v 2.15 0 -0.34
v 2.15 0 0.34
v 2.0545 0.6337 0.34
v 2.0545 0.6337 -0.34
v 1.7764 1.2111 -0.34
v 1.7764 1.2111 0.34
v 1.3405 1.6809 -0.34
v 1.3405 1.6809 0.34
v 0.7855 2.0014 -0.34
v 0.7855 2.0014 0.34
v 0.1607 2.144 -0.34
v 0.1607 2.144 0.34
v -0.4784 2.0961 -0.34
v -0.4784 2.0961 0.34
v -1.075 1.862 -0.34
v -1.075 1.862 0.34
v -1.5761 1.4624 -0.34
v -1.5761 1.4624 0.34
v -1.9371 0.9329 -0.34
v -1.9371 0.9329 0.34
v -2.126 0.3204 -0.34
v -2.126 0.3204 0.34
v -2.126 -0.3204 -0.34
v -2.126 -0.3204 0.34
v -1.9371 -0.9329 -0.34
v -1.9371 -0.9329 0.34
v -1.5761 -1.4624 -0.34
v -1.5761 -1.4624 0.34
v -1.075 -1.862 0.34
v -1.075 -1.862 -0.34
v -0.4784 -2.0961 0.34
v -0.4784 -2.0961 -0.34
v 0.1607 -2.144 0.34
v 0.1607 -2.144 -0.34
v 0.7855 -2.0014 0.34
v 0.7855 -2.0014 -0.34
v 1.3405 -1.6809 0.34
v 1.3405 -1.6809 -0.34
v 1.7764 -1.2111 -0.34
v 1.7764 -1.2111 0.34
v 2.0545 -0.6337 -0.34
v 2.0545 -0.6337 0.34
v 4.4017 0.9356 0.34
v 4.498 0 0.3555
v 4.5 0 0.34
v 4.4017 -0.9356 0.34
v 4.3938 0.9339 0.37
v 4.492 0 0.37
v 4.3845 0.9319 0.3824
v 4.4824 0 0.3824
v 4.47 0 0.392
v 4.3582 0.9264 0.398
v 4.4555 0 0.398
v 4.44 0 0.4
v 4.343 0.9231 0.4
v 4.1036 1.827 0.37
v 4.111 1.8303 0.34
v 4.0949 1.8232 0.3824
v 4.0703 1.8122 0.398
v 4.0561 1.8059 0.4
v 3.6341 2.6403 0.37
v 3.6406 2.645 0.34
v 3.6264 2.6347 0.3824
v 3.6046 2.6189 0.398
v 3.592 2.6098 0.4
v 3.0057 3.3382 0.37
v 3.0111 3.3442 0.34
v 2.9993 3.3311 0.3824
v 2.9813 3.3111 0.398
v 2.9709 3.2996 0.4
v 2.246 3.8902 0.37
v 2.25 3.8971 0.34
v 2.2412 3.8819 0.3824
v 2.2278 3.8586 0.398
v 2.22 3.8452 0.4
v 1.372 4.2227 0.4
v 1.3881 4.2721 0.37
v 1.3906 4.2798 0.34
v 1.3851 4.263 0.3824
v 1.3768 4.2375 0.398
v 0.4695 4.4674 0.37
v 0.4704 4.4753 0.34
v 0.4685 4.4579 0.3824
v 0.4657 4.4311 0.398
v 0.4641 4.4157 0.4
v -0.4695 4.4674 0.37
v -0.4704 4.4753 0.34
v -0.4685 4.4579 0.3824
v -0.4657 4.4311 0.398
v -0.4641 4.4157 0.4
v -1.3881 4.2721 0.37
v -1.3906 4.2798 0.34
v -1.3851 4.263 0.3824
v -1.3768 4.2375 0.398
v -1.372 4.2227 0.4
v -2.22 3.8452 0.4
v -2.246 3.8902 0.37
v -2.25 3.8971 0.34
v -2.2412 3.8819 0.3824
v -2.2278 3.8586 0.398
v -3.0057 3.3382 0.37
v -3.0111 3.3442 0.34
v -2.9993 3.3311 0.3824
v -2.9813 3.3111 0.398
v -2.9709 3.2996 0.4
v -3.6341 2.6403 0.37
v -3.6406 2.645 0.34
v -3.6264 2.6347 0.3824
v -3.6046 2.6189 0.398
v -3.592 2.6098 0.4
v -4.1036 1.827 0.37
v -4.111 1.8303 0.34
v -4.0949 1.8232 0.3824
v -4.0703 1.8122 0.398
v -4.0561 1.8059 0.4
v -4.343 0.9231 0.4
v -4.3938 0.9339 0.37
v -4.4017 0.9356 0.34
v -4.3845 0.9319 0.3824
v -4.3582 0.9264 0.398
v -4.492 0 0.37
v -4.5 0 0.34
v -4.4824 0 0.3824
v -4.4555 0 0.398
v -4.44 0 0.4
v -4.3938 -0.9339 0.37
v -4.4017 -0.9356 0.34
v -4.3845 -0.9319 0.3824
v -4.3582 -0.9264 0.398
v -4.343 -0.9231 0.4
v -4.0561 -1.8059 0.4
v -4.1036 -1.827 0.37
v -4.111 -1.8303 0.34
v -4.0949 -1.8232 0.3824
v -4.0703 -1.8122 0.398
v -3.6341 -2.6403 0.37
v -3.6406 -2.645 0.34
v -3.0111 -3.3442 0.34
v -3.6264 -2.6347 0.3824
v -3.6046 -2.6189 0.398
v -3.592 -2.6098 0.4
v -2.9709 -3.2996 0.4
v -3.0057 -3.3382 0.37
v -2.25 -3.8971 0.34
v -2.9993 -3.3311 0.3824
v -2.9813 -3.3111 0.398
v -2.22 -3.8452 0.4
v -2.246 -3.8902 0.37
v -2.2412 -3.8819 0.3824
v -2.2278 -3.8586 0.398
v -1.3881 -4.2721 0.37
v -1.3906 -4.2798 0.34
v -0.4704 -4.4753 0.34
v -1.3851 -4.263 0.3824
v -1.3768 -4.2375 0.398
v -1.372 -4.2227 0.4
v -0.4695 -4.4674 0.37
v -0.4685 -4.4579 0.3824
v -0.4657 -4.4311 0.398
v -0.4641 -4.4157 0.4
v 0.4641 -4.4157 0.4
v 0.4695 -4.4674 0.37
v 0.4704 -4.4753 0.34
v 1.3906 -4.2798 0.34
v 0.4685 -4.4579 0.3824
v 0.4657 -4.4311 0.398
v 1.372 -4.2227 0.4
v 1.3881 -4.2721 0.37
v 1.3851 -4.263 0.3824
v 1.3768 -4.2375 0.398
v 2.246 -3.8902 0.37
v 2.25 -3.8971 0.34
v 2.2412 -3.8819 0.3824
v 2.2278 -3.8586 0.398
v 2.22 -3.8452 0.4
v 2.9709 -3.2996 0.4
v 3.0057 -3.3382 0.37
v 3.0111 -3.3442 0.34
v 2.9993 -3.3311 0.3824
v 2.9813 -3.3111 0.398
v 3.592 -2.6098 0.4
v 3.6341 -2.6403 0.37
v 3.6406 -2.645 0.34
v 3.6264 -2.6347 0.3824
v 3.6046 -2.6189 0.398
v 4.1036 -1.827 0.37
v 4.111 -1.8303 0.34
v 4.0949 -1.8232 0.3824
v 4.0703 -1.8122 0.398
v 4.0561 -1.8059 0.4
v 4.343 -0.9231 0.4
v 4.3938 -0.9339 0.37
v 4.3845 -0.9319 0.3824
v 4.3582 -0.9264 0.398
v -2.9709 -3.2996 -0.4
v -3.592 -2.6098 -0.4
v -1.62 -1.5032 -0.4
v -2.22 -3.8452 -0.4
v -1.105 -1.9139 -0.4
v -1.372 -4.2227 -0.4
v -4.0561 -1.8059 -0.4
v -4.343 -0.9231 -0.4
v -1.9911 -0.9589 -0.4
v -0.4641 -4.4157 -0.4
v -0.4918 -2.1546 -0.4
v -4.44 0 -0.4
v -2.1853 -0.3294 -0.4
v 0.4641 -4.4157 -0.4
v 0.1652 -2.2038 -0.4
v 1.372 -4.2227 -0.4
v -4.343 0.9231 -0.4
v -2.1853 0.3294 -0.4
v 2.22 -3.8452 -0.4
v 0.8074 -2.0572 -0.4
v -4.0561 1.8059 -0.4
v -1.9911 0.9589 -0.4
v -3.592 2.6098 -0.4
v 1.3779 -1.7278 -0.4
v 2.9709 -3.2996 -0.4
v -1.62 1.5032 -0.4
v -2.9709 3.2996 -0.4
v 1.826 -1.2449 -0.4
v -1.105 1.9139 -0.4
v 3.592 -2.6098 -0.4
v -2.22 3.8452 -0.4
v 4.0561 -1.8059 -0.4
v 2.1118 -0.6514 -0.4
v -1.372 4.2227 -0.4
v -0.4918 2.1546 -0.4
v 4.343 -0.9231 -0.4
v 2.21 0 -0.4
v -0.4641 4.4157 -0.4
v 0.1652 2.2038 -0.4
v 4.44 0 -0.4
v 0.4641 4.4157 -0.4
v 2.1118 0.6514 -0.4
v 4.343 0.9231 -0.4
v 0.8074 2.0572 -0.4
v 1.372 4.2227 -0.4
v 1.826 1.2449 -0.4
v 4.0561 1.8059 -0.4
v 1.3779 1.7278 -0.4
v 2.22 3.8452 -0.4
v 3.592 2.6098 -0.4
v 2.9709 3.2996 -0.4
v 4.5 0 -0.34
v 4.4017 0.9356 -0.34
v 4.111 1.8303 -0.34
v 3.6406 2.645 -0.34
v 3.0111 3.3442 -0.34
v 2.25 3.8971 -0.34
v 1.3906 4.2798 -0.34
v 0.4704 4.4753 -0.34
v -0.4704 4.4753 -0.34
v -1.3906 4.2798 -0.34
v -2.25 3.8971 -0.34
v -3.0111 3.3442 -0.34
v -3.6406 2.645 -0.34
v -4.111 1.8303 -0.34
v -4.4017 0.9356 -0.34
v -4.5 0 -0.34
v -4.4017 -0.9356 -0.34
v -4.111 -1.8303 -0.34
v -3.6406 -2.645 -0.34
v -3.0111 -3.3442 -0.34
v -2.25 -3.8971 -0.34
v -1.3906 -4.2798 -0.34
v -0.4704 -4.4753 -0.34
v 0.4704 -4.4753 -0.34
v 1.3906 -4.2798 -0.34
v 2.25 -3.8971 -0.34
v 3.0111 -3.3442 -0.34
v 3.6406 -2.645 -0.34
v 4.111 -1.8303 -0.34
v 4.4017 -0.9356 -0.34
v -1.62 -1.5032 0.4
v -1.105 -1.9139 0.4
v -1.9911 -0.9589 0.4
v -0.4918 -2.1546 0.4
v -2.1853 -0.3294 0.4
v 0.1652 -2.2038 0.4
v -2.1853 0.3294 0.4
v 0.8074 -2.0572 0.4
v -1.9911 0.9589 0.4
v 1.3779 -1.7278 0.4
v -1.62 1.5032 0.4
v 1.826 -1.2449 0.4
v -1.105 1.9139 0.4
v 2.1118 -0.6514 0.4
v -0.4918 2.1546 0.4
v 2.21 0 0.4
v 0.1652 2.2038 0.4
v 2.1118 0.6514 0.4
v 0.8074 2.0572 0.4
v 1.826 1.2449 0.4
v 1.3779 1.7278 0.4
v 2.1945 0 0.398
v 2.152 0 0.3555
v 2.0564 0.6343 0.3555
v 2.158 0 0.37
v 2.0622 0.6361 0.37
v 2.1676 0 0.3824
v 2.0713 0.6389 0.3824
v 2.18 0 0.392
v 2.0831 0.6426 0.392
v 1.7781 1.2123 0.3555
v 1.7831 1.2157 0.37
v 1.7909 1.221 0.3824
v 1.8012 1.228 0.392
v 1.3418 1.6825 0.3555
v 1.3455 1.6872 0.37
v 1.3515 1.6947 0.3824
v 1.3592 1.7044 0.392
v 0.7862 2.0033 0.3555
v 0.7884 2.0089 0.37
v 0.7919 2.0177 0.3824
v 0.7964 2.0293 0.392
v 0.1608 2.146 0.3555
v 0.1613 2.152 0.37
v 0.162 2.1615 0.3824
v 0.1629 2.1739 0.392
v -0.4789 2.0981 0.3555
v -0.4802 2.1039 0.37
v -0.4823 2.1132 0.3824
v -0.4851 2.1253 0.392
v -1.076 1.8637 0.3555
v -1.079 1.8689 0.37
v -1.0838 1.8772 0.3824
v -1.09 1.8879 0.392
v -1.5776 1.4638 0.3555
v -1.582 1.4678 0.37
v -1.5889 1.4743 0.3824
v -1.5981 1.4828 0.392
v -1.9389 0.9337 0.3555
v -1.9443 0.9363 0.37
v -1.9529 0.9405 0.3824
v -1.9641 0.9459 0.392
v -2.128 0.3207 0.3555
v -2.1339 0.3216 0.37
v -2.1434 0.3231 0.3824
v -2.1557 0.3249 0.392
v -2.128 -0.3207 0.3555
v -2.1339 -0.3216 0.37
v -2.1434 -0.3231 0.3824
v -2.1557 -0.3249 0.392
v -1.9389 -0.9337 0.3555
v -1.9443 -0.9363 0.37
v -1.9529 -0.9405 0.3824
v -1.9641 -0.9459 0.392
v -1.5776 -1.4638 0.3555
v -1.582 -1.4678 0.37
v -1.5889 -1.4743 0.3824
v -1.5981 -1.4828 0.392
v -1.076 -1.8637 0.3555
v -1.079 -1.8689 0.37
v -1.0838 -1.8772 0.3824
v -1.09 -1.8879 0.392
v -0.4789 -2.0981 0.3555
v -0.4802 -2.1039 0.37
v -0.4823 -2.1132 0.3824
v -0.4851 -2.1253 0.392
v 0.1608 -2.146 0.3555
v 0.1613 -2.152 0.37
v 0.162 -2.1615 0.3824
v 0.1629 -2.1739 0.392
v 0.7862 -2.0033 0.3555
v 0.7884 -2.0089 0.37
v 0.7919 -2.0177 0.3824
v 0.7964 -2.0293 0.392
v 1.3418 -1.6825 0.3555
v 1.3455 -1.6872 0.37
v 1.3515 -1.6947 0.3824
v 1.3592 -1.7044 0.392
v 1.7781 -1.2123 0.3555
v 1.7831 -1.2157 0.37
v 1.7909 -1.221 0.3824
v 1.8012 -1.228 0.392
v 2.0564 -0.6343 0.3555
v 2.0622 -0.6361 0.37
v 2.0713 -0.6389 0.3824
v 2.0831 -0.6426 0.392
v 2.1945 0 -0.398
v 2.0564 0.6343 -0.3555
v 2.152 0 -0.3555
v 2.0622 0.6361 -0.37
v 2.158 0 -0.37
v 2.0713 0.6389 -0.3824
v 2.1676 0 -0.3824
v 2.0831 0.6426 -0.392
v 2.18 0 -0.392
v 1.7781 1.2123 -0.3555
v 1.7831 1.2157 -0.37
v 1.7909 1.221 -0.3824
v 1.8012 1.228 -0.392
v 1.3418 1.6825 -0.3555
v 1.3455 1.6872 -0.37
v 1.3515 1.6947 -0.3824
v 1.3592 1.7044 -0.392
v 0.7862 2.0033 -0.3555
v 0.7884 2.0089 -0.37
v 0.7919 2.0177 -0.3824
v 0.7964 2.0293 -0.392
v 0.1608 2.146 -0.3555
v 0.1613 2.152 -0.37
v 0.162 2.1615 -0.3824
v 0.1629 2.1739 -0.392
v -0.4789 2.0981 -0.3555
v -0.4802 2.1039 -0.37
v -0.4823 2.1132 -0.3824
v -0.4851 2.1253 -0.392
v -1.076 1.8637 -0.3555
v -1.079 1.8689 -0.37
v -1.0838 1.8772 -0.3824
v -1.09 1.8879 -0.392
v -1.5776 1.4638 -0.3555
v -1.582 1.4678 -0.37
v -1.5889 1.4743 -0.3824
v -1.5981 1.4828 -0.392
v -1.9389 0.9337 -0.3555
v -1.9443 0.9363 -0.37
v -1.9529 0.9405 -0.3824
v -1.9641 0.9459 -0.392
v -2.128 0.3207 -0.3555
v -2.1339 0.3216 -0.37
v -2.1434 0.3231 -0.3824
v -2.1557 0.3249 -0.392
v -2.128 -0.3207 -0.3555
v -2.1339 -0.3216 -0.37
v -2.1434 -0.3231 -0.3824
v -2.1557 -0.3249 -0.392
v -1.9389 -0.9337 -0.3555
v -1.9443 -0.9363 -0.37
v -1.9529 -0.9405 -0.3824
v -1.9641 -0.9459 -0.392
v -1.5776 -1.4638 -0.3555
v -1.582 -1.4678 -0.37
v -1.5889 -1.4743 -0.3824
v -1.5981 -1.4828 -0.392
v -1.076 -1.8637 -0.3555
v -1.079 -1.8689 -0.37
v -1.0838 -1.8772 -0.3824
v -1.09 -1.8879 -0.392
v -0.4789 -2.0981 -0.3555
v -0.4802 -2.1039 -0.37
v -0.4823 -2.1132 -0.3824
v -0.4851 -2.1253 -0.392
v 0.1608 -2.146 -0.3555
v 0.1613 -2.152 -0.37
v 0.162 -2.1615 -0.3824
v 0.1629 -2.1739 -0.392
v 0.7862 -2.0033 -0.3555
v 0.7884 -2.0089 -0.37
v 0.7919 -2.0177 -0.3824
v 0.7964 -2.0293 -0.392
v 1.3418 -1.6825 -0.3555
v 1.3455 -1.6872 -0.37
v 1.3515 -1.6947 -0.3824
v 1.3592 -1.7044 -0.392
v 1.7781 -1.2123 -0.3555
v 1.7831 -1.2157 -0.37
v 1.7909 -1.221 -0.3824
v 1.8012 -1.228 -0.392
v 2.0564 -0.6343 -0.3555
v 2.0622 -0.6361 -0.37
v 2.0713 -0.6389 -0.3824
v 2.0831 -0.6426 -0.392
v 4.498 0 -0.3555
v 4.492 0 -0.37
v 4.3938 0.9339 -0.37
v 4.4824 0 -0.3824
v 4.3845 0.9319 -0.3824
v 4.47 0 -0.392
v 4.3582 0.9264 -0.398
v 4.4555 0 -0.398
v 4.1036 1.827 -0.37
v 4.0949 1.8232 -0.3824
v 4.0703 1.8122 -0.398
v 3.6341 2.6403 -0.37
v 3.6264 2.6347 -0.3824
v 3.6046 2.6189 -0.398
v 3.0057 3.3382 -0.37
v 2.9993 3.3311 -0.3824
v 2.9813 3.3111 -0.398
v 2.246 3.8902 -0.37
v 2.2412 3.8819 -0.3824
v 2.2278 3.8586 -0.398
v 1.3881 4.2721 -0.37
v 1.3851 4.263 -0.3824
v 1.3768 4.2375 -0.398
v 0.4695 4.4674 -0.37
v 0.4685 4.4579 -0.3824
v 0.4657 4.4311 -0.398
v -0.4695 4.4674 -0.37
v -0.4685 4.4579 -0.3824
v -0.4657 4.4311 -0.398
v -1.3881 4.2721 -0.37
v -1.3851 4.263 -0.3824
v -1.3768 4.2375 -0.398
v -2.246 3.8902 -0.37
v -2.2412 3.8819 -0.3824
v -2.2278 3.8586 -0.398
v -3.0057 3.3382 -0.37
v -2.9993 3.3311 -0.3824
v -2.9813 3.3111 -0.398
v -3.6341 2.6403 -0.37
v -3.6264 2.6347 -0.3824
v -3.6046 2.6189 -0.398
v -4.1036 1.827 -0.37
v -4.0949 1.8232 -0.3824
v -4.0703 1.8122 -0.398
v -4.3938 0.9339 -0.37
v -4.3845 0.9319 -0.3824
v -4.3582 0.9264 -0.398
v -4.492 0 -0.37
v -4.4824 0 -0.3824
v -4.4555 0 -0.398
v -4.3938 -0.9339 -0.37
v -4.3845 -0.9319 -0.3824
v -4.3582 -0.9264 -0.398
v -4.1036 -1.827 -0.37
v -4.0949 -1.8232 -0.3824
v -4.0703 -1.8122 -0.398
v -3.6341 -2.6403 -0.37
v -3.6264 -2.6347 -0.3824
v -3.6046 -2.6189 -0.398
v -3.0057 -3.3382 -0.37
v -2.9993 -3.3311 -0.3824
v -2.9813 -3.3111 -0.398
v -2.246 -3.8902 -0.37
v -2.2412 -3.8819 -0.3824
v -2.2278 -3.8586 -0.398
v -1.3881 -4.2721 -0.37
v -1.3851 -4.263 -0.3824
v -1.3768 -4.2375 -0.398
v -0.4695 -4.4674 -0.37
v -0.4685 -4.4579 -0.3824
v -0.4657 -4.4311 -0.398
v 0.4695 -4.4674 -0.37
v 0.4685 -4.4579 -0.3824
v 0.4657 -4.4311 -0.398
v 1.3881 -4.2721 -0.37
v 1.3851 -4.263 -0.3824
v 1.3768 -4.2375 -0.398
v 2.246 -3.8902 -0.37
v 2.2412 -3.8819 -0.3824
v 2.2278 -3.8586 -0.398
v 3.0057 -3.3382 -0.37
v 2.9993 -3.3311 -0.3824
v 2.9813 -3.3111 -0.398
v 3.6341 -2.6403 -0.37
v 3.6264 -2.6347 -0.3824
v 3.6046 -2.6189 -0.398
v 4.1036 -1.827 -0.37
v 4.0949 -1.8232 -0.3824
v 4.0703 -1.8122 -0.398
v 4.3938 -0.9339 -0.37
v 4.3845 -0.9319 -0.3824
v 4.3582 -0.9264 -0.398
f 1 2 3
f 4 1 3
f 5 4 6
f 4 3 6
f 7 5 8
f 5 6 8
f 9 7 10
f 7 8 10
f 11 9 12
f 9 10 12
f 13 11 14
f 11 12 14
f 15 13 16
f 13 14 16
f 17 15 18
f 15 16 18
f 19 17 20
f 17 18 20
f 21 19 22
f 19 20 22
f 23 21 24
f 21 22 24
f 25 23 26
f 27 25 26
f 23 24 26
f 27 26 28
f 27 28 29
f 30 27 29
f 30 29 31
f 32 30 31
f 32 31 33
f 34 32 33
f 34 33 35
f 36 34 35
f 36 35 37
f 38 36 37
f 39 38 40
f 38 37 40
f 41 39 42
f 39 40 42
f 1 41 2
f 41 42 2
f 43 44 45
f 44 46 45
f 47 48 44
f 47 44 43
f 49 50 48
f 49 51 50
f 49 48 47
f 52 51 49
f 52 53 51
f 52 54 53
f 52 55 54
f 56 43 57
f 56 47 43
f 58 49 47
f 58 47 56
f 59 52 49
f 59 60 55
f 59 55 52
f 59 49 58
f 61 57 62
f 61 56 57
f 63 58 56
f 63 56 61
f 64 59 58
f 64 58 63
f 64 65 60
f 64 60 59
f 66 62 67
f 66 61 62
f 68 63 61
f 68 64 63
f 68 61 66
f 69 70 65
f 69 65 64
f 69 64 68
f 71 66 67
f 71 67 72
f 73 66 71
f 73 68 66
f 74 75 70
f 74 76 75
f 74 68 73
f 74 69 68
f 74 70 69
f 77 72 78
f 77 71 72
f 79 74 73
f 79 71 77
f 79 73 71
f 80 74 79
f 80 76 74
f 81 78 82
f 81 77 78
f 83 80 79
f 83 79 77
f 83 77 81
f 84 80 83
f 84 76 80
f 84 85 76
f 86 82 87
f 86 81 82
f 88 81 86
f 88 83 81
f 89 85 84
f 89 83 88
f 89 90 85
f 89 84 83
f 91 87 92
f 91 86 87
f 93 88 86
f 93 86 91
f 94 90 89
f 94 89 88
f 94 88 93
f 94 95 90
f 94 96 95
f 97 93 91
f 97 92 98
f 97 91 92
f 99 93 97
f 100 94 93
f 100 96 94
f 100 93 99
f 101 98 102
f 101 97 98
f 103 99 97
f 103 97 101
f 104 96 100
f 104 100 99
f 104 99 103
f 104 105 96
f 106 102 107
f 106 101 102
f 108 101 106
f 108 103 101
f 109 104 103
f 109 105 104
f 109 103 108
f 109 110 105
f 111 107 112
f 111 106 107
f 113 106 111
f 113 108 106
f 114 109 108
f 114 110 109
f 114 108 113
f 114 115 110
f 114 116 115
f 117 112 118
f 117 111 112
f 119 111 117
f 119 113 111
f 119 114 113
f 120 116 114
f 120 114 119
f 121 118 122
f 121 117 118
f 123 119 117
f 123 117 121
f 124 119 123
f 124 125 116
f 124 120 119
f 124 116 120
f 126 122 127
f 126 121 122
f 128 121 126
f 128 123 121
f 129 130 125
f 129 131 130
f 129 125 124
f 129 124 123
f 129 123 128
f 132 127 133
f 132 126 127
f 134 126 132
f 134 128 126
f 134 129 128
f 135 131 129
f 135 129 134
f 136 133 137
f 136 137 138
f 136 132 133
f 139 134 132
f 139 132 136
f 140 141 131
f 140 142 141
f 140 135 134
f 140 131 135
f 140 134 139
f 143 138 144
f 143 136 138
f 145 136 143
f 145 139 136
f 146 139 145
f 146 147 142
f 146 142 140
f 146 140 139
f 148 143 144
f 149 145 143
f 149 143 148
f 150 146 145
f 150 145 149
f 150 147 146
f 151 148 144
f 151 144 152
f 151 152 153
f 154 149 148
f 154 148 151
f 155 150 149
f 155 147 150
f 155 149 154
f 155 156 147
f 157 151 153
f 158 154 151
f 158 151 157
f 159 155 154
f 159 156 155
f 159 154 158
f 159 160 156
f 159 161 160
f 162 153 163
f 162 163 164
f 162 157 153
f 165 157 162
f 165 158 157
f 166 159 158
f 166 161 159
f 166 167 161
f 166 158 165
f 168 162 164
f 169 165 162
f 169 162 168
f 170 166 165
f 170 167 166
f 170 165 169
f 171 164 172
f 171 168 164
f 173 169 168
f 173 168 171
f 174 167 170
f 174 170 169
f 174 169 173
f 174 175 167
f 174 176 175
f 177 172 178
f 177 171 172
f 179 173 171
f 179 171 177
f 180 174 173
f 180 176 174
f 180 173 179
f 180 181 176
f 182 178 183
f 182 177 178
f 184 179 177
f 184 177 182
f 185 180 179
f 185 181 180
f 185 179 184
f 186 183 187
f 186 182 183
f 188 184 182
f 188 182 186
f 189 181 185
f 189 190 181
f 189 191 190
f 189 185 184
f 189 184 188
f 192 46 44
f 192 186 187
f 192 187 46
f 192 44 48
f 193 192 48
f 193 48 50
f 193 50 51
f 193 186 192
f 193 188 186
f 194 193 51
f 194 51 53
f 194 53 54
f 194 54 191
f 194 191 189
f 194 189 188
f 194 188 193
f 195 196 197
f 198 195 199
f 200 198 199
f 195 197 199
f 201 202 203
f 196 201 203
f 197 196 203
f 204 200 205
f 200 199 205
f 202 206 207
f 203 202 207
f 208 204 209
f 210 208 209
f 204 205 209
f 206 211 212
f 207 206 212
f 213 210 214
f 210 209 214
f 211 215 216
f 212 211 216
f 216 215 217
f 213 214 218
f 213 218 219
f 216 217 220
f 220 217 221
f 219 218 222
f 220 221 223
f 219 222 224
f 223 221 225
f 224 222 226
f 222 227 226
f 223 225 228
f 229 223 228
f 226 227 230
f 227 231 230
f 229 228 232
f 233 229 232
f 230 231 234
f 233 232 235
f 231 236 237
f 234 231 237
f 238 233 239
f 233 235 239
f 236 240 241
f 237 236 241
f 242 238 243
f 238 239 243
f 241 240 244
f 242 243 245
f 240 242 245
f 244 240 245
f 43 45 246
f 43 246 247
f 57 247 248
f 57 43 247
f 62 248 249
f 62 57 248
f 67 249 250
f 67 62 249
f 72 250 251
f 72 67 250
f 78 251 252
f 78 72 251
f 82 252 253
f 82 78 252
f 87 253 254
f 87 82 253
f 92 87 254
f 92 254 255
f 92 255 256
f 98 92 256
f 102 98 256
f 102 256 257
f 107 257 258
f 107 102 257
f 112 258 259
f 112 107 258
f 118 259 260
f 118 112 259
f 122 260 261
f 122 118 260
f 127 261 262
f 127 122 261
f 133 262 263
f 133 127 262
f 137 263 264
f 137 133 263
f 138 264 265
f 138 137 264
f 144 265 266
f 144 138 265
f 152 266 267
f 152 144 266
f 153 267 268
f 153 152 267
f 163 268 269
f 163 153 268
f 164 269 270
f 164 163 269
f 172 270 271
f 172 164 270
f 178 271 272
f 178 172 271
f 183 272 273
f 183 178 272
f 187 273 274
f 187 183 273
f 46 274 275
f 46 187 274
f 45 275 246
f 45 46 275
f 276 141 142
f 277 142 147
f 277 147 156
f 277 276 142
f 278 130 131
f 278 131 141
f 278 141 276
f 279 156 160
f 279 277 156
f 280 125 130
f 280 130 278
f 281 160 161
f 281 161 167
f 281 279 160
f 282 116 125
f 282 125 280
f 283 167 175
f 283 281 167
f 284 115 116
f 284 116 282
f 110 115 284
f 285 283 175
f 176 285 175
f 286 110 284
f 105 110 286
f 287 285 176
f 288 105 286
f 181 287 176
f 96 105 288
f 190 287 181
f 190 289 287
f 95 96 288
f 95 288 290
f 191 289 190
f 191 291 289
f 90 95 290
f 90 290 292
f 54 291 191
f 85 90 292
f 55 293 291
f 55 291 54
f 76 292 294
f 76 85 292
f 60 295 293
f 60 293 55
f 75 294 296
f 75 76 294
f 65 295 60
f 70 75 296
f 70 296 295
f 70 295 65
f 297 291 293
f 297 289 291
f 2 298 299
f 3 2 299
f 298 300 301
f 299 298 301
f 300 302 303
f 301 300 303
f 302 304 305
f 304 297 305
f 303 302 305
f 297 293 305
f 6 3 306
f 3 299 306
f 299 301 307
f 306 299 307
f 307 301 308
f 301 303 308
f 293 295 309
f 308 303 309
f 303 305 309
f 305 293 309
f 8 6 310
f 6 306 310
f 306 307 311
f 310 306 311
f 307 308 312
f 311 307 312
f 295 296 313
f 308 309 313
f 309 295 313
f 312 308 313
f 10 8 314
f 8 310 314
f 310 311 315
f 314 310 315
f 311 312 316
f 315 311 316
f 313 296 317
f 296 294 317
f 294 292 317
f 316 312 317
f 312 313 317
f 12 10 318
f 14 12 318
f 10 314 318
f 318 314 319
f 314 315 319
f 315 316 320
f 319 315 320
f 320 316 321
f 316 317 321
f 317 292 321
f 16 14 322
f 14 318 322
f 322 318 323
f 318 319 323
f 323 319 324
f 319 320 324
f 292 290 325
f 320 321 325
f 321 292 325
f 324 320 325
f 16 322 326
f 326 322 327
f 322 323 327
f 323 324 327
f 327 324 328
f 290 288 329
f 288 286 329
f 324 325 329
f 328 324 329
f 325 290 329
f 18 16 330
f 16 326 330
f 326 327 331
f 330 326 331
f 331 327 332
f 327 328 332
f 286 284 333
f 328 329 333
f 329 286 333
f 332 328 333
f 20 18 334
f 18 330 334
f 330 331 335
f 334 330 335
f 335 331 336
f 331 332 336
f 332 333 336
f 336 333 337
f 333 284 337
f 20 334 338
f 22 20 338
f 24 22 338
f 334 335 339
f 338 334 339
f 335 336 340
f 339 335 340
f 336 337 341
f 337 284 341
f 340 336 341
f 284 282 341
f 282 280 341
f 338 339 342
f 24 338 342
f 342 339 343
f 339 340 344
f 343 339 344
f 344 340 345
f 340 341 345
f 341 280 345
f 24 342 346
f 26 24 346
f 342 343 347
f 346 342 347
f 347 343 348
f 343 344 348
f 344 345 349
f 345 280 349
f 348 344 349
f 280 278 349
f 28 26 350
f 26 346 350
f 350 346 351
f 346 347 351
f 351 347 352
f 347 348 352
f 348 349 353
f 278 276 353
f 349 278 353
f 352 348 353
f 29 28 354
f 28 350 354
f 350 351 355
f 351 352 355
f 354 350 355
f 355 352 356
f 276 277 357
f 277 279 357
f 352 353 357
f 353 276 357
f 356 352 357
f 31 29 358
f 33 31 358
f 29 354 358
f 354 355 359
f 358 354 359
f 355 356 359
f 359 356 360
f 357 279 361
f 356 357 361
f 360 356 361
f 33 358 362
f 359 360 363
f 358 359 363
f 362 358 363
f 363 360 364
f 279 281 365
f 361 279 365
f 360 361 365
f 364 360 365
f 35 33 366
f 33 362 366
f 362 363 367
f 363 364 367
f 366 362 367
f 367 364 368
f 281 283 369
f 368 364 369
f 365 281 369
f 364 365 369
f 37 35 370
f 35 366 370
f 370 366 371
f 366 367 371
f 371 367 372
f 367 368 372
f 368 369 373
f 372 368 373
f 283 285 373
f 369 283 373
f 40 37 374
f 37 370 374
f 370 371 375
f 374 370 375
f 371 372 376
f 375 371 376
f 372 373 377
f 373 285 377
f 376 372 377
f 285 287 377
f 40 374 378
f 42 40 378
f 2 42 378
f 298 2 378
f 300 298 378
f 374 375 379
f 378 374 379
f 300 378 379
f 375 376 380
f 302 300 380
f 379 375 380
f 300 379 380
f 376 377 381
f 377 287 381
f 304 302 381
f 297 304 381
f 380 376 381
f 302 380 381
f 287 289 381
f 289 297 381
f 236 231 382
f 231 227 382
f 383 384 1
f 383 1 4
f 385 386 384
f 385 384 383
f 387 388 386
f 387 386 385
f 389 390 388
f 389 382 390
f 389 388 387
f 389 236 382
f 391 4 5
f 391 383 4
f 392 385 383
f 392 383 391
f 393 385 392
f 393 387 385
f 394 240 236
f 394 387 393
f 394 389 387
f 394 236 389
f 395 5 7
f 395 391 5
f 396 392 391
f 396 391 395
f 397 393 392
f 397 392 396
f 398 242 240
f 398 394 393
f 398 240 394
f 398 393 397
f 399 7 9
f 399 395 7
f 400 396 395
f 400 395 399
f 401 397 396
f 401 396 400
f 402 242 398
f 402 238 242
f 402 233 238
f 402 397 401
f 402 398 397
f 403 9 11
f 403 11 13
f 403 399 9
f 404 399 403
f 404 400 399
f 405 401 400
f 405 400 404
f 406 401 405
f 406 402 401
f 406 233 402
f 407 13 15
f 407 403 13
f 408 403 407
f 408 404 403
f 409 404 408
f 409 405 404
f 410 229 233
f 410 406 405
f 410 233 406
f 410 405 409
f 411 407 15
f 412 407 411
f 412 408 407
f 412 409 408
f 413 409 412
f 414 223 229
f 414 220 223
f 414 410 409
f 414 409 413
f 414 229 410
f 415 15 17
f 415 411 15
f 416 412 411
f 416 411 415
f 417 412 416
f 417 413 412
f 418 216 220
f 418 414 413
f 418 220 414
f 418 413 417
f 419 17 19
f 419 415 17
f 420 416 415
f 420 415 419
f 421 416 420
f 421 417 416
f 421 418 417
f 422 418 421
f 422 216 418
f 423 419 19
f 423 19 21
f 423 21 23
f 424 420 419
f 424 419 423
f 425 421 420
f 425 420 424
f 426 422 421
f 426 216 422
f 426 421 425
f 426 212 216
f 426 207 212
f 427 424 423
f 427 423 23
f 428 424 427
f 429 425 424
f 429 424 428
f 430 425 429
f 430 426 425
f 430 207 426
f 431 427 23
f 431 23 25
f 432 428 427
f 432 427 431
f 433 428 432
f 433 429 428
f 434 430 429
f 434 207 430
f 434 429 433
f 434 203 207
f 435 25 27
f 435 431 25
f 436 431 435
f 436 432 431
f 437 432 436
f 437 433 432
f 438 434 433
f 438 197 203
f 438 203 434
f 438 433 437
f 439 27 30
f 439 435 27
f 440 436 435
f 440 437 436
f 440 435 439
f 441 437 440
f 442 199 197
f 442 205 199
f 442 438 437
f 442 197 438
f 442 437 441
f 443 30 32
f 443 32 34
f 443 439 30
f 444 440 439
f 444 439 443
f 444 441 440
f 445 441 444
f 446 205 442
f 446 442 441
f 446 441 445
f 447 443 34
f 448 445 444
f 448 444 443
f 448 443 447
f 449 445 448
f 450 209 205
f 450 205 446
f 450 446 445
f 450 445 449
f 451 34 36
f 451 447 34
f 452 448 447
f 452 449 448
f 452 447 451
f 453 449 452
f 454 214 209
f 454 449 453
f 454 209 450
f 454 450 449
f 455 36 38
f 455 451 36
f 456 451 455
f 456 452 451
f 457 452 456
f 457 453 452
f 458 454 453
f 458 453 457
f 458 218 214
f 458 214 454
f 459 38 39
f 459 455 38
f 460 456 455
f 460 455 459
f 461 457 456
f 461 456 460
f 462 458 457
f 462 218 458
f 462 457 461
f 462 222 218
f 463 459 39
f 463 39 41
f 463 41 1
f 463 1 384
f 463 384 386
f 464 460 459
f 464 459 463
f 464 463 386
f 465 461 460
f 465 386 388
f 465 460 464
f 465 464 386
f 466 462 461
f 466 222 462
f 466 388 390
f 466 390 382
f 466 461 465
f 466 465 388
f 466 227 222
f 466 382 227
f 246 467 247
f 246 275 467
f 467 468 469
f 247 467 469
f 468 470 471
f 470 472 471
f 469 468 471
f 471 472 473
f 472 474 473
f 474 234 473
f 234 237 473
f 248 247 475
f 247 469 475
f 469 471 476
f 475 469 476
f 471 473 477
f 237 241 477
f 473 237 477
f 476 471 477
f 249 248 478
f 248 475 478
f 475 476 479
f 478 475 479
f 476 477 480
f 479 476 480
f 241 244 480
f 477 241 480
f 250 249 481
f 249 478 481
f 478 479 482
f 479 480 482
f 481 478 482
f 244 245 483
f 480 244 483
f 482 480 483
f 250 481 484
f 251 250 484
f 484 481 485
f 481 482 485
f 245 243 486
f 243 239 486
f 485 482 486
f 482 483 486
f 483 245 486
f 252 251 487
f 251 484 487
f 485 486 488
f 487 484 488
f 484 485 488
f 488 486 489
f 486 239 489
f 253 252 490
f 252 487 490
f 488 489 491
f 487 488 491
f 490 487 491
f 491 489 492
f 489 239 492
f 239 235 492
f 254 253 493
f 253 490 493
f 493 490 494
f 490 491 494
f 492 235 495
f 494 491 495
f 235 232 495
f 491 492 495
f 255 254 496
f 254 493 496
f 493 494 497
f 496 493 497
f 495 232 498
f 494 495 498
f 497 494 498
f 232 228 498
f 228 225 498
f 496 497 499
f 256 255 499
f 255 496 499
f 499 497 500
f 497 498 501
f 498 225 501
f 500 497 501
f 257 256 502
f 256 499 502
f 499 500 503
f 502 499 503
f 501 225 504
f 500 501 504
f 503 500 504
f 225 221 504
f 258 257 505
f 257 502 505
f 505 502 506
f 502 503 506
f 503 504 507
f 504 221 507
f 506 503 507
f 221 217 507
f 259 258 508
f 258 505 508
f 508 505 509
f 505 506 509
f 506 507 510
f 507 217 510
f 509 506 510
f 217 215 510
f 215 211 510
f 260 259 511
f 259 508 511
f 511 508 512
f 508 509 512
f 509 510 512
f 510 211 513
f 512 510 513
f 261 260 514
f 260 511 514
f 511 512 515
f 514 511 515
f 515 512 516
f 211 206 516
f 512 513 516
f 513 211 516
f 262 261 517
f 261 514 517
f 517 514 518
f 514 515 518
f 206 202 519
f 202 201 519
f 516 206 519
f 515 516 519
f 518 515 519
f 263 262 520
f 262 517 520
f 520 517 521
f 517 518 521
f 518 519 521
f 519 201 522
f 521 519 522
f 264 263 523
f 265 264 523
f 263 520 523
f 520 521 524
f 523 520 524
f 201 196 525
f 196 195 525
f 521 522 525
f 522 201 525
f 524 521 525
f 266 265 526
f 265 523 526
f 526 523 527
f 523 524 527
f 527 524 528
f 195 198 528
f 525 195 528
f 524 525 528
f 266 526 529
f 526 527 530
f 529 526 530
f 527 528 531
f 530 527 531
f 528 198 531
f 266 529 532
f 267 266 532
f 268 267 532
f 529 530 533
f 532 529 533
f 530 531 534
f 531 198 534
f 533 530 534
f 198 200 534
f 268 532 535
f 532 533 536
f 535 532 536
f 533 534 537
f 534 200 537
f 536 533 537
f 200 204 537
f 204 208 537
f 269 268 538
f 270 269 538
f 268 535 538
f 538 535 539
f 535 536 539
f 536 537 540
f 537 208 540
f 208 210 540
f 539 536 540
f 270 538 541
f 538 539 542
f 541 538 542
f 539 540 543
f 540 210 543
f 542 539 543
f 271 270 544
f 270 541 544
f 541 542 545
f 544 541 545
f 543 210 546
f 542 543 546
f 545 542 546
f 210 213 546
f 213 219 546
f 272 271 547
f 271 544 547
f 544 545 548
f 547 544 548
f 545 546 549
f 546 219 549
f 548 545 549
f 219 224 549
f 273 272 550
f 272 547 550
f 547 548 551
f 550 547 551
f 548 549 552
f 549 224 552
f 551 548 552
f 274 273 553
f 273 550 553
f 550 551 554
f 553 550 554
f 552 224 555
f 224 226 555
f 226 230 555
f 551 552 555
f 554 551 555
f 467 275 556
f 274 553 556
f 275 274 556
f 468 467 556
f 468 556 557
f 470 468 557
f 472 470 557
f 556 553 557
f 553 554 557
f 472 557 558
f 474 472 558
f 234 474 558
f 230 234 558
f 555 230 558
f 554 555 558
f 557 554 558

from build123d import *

# Parameters (mm, degrees)
BOSS_EXTRUDE1_START = 0.4
SKETCH3_R           = 4.5
SKETCH3_R_2         = 2.15
BOSS_EXTRUDE1_DEPTH = 0.8
FILLET1_R           = 0.06


with BuildPart() as part:
    # Sketch3 → Boss-Extrude1 (new body)
    with BuildSketch(Plane.XY.offset(BOSS_EXTRUDE1_START)):
        Circle(SKETCH3_R)
        Circle(SKETCH3_R_2, mode=Mode.SUBTRACT)
    extrude(amount=-BOSS_EXTRUDE1_DEPTH)

    # Fillet1
    fillet1_edges = [part.edges().sort_by_distance(p)[0] for p in [
        (-4.5, 0, 0.4),
        (-4.5, 0, -0.4),
        (-2.15, 0, -0.4),
        (-2.15, 0, 0.4),
    ]]
    fillet(fillet1_edges, radius=FILLET1_R)


solid = part.part
